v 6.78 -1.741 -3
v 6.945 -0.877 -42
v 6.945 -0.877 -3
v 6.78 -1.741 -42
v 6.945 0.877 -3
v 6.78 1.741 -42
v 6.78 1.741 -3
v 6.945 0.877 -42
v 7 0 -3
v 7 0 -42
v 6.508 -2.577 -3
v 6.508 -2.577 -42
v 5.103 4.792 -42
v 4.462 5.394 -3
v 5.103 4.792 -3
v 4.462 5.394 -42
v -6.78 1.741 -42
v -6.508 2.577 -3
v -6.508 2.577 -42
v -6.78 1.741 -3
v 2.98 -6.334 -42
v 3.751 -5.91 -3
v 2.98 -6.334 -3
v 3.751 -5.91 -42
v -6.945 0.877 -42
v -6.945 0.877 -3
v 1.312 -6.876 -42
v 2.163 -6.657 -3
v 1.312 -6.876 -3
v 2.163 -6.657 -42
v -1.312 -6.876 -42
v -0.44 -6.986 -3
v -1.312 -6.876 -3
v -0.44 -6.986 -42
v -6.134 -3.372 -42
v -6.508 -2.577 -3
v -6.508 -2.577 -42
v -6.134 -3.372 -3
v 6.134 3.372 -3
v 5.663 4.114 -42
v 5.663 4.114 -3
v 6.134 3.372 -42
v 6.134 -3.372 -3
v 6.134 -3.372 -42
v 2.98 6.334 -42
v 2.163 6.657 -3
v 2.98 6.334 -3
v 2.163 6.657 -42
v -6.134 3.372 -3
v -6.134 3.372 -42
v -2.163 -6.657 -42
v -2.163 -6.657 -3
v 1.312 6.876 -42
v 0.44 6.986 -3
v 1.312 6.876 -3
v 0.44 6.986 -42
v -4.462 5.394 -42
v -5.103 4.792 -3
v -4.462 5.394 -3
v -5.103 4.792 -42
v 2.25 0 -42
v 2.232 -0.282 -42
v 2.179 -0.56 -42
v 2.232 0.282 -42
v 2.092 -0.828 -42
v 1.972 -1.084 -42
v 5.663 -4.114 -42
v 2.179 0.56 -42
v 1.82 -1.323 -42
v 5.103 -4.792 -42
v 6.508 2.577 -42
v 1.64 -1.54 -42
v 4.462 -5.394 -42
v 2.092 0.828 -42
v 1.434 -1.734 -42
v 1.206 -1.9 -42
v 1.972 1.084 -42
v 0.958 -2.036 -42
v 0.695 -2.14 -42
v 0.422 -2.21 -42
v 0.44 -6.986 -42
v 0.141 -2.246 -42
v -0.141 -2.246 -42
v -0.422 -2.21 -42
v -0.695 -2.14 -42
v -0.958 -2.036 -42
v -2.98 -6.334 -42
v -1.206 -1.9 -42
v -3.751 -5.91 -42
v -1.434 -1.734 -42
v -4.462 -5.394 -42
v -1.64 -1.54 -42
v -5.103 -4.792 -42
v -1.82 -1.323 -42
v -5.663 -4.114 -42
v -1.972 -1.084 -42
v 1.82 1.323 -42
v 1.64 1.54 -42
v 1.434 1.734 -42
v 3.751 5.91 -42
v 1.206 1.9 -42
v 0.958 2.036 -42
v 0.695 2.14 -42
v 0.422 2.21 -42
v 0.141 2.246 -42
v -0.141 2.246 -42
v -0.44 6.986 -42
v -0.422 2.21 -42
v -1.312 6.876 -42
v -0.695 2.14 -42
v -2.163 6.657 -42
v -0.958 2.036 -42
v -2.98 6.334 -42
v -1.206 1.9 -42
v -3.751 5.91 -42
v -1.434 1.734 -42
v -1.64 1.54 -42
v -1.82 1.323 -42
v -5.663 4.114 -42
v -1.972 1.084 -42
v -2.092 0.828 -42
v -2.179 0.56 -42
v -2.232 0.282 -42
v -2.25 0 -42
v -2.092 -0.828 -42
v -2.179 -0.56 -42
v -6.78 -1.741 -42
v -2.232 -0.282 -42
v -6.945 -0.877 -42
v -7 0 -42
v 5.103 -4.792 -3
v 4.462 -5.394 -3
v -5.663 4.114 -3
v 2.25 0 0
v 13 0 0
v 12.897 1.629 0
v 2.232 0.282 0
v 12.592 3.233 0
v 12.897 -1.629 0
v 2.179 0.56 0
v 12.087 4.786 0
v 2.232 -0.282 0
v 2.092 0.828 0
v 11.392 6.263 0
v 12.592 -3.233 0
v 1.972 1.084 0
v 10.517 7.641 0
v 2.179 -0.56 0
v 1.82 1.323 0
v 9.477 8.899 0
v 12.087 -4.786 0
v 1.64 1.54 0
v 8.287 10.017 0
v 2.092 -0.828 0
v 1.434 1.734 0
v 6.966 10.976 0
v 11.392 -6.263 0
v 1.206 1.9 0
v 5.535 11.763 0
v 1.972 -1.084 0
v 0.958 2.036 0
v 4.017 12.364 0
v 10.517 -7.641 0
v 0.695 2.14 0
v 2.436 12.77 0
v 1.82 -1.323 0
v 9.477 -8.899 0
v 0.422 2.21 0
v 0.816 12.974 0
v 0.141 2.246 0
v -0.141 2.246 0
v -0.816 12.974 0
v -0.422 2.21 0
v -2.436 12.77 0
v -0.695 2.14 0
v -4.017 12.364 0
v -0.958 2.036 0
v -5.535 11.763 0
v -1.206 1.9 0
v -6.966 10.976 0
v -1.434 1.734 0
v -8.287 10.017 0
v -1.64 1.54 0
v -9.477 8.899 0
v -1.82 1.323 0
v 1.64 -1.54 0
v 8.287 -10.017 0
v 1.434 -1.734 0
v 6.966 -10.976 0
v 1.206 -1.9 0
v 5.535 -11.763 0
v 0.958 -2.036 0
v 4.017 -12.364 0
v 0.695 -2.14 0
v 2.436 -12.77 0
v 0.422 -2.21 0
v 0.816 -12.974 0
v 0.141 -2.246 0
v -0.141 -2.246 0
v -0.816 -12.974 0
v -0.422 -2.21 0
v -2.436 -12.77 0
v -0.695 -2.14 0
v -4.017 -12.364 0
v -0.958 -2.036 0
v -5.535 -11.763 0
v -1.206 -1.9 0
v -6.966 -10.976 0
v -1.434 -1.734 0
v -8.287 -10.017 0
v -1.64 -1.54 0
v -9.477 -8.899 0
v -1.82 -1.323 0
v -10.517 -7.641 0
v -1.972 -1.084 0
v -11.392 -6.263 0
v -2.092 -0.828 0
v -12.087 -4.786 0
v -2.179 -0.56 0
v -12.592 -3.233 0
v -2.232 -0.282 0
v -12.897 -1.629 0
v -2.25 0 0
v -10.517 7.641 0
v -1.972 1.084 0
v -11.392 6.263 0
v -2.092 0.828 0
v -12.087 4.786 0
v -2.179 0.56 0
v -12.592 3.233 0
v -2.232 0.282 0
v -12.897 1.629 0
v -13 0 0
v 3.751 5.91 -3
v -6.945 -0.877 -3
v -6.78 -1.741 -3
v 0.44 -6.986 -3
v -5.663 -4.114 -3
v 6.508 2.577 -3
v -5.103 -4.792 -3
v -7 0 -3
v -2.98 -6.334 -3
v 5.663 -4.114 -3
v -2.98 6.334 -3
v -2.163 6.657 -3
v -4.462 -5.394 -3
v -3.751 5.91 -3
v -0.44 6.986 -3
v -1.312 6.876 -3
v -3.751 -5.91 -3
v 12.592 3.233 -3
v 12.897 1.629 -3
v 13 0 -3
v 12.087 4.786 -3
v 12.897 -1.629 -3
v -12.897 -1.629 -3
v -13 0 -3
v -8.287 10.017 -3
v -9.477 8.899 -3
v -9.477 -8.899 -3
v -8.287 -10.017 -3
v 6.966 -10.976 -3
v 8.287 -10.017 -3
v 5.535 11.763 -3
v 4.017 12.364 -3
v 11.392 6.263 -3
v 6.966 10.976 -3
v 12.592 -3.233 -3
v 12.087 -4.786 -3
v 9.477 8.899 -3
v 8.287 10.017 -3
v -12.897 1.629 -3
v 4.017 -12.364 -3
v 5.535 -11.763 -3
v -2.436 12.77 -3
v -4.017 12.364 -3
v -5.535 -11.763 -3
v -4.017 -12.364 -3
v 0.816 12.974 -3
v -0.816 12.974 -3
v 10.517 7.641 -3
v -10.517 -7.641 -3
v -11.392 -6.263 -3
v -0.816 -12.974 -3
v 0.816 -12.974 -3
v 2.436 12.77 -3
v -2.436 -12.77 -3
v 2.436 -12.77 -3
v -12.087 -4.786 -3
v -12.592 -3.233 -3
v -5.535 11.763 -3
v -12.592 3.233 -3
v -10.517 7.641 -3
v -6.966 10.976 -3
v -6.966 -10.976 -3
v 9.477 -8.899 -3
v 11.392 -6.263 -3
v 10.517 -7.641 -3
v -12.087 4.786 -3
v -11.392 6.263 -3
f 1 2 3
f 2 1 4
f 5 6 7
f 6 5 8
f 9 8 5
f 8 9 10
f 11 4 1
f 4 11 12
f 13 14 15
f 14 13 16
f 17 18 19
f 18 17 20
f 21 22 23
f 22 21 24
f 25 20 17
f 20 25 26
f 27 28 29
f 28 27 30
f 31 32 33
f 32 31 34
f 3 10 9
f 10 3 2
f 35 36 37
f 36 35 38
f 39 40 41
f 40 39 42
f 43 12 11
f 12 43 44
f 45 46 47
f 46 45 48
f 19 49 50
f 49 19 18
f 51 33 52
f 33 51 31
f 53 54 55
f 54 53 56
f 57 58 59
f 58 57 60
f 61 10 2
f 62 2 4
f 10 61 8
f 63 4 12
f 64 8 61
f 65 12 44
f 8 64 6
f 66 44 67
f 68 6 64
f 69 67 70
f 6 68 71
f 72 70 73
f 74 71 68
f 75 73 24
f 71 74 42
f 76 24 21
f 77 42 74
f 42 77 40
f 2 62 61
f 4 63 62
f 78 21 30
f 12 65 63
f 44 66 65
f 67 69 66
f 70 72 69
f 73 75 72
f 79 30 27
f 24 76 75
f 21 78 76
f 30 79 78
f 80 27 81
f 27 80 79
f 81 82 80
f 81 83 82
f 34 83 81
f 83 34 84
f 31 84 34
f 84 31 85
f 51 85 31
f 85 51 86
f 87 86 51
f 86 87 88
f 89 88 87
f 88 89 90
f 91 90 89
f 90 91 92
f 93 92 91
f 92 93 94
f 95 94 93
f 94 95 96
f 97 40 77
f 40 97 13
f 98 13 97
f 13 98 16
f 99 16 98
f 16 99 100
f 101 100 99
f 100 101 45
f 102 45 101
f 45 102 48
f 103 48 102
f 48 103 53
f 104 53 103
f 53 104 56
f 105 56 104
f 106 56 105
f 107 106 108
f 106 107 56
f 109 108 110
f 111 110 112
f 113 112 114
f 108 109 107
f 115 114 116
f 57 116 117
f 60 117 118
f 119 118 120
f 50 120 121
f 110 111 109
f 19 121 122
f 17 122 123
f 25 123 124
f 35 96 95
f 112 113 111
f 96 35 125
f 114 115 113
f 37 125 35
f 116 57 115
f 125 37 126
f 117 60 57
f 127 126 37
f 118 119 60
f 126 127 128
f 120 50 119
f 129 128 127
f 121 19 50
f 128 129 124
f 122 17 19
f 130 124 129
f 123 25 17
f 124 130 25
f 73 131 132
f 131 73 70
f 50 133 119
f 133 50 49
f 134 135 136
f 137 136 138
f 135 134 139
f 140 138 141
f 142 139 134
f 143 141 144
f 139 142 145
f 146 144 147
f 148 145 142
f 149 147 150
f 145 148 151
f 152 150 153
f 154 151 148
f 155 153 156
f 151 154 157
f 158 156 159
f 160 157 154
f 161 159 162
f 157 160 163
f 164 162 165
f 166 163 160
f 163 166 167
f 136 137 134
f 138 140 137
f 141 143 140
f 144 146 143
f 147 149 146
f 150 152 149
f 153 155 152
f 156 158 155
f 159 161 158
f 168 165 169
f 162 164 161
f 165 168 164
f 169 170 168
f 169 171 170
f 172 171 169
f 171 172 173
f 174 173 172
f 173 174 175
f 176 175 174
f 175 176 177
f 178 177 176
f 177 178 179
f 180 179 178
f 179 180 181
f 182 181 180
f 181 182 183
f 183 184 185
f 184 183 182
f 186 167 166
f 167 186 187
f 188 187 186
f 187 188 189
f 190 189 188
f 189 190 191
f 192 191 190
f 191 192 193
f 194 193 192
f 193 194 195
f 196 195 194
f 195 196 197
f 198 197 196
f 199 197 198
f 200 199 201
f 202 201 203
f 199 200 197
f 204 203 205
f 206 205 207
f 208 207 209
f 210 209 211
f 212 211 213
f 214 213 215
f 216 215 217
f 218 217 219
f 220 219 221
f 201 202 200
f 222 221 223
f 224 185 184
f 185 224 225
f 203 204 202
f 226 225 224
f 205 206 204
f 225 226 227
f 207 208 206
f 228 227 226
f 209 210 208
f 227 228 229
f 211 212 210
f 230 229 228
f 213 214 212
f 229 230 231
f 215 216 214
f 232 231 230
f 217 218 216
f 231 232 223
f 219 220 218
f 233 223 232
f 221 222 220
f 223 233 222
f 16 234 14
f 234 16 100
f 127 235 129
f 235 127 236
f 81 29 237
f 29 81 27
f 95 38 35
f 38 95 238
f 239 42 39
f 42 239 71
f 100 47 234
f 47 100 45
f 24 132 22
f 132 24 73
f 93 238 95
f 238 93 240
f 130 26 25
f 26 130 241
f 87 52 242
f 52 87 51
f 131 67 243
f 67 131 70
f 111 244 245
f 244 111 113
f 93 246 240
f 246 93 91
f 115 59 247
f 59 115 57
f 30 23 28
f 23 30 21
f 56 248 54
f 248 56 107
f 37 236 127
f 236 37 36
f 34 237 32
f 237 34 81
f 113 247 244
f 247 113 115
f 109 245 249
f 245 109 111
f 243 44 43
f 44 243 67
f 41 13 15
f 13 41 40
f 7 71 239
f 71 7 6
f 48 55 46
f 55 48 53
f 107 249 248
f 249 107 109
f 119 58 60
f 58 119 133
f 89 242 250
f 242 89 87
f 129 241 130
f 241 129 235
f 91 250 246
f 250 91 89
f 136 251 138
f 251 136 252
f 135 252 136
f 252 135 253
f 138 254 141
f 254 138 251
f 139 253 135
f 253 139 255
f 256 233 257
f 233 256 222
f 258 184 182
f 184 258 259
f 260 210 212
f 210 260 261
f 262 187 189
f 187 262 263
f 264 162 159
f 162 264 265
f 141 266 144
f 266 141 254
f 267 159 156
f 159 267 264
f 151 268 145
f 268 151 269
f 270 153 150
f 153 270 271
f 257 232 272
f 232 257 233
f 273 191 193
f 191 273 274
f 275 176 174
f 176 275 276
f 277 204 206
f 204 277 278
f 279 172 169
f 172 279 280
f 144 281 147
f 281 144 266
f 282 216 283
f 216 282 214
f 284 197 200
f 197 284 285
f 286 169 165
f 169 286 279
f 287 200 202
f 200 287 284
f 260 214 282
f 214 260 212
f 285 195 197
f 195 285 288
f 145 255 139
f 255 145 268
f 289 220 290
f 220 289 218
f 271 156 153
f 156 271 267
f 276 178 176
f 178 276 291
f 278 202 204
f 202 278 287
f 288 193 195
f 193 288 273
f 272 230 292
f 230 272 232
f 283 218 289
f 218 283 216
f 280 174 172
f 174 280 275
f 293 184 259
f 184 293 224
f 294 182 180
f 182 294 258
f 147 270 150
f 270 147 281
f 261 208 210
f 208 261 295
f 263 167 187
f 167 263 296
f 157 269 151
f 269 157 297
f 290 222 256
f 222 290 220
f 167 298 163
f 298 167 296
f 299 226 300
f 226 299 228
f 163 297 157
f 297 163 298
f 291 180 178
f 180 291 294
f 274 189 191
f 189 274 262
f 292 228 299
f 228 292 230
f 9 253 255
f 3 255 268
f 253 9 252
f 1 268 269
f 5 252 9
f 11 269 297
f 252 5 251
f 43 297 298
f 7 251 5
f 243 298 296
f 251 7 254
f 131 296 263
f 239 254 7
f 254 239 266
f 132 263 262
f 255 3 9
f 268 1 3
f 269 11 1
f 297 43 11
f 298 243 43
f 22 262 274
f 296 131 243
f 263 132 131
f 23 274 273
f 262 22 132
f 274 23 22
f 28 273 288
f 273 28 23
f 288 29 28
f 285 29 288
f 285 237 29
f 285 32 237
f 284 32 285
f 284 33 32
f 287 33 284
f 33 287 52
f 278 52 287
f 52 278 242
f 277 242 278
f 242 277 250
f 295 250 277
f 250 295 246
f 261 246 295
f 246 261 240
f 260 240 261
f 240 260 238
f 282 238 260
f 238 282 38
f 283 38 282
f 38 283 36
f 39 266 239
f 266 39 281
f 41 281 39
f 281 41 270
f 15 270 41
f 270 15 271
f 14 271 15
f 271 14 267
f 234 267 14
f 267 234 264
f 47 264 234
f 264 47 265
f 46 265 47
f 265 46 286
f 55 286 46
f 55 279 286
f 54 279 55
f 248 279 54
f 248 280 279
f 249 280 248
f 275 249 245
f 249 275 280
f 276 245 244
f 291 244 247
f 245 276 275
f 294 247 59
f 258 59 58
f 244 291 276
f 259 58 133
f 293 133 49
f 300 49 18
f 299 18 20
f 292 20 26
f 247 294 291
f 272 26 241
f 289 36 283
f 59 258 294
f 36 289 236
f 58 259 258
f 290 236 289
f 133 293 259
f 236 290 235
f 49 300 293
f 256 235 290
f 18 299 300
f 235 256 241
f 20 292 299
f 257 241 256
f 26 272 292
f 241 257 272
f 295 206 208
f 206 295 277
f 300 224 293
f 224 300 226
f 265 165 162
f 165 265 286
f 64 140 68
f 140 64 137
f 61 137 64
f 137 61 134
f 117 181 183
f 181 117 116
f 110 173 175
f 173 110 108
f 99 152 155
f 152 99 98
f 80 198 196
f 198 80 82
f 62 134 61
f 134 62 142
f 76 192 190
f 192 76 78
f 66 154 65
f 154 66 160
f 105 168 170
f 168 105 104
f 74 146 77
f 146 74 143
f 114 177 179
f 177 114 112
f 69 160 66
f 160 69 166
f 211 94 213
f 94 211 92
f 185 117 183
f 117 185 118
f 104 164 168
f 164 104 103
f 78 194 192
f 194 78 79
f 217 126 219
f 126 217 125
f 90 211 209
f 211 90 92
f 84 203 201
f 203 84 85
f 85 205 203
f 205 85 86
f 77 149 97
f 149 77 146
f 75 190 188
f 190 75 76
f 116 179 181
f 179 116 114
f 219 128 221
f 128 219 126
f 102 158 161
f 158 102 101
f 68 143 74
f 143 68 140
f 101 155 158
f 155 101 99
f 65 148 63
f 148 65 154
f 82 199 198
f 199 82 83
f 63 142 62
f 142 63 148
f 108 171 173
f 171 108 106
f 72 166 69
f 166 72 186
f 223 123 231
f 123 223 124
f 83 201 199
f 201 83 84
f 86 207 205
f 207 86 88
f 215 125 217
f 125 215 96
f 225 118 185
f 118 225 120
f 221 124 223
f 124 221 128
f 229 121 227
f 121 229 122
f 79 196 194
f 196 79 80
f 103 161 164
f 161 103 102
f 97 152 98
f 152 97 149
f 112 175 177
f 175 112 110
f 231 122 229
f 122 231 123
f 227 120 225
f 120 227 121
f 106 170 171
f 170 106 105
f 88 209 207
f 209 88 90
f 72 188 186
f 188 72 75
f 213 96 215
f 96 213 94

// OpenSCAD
$fn = 50;


difference() {
	union() {
		translate(v = [0, 0, -42.0000000000]) {
			cylinder(h = 42, r = 7.0000000000);
		}
		translate(v = [0, 0, -3.0000000000]) {
			cylinder(h = 3, r = 13.0000000000);
		}
	}
	union() {
		#translate(v = [0, 0, -42]) {
			cylinder(h = 42, r = 2.2500000000);
		}
	}
}
